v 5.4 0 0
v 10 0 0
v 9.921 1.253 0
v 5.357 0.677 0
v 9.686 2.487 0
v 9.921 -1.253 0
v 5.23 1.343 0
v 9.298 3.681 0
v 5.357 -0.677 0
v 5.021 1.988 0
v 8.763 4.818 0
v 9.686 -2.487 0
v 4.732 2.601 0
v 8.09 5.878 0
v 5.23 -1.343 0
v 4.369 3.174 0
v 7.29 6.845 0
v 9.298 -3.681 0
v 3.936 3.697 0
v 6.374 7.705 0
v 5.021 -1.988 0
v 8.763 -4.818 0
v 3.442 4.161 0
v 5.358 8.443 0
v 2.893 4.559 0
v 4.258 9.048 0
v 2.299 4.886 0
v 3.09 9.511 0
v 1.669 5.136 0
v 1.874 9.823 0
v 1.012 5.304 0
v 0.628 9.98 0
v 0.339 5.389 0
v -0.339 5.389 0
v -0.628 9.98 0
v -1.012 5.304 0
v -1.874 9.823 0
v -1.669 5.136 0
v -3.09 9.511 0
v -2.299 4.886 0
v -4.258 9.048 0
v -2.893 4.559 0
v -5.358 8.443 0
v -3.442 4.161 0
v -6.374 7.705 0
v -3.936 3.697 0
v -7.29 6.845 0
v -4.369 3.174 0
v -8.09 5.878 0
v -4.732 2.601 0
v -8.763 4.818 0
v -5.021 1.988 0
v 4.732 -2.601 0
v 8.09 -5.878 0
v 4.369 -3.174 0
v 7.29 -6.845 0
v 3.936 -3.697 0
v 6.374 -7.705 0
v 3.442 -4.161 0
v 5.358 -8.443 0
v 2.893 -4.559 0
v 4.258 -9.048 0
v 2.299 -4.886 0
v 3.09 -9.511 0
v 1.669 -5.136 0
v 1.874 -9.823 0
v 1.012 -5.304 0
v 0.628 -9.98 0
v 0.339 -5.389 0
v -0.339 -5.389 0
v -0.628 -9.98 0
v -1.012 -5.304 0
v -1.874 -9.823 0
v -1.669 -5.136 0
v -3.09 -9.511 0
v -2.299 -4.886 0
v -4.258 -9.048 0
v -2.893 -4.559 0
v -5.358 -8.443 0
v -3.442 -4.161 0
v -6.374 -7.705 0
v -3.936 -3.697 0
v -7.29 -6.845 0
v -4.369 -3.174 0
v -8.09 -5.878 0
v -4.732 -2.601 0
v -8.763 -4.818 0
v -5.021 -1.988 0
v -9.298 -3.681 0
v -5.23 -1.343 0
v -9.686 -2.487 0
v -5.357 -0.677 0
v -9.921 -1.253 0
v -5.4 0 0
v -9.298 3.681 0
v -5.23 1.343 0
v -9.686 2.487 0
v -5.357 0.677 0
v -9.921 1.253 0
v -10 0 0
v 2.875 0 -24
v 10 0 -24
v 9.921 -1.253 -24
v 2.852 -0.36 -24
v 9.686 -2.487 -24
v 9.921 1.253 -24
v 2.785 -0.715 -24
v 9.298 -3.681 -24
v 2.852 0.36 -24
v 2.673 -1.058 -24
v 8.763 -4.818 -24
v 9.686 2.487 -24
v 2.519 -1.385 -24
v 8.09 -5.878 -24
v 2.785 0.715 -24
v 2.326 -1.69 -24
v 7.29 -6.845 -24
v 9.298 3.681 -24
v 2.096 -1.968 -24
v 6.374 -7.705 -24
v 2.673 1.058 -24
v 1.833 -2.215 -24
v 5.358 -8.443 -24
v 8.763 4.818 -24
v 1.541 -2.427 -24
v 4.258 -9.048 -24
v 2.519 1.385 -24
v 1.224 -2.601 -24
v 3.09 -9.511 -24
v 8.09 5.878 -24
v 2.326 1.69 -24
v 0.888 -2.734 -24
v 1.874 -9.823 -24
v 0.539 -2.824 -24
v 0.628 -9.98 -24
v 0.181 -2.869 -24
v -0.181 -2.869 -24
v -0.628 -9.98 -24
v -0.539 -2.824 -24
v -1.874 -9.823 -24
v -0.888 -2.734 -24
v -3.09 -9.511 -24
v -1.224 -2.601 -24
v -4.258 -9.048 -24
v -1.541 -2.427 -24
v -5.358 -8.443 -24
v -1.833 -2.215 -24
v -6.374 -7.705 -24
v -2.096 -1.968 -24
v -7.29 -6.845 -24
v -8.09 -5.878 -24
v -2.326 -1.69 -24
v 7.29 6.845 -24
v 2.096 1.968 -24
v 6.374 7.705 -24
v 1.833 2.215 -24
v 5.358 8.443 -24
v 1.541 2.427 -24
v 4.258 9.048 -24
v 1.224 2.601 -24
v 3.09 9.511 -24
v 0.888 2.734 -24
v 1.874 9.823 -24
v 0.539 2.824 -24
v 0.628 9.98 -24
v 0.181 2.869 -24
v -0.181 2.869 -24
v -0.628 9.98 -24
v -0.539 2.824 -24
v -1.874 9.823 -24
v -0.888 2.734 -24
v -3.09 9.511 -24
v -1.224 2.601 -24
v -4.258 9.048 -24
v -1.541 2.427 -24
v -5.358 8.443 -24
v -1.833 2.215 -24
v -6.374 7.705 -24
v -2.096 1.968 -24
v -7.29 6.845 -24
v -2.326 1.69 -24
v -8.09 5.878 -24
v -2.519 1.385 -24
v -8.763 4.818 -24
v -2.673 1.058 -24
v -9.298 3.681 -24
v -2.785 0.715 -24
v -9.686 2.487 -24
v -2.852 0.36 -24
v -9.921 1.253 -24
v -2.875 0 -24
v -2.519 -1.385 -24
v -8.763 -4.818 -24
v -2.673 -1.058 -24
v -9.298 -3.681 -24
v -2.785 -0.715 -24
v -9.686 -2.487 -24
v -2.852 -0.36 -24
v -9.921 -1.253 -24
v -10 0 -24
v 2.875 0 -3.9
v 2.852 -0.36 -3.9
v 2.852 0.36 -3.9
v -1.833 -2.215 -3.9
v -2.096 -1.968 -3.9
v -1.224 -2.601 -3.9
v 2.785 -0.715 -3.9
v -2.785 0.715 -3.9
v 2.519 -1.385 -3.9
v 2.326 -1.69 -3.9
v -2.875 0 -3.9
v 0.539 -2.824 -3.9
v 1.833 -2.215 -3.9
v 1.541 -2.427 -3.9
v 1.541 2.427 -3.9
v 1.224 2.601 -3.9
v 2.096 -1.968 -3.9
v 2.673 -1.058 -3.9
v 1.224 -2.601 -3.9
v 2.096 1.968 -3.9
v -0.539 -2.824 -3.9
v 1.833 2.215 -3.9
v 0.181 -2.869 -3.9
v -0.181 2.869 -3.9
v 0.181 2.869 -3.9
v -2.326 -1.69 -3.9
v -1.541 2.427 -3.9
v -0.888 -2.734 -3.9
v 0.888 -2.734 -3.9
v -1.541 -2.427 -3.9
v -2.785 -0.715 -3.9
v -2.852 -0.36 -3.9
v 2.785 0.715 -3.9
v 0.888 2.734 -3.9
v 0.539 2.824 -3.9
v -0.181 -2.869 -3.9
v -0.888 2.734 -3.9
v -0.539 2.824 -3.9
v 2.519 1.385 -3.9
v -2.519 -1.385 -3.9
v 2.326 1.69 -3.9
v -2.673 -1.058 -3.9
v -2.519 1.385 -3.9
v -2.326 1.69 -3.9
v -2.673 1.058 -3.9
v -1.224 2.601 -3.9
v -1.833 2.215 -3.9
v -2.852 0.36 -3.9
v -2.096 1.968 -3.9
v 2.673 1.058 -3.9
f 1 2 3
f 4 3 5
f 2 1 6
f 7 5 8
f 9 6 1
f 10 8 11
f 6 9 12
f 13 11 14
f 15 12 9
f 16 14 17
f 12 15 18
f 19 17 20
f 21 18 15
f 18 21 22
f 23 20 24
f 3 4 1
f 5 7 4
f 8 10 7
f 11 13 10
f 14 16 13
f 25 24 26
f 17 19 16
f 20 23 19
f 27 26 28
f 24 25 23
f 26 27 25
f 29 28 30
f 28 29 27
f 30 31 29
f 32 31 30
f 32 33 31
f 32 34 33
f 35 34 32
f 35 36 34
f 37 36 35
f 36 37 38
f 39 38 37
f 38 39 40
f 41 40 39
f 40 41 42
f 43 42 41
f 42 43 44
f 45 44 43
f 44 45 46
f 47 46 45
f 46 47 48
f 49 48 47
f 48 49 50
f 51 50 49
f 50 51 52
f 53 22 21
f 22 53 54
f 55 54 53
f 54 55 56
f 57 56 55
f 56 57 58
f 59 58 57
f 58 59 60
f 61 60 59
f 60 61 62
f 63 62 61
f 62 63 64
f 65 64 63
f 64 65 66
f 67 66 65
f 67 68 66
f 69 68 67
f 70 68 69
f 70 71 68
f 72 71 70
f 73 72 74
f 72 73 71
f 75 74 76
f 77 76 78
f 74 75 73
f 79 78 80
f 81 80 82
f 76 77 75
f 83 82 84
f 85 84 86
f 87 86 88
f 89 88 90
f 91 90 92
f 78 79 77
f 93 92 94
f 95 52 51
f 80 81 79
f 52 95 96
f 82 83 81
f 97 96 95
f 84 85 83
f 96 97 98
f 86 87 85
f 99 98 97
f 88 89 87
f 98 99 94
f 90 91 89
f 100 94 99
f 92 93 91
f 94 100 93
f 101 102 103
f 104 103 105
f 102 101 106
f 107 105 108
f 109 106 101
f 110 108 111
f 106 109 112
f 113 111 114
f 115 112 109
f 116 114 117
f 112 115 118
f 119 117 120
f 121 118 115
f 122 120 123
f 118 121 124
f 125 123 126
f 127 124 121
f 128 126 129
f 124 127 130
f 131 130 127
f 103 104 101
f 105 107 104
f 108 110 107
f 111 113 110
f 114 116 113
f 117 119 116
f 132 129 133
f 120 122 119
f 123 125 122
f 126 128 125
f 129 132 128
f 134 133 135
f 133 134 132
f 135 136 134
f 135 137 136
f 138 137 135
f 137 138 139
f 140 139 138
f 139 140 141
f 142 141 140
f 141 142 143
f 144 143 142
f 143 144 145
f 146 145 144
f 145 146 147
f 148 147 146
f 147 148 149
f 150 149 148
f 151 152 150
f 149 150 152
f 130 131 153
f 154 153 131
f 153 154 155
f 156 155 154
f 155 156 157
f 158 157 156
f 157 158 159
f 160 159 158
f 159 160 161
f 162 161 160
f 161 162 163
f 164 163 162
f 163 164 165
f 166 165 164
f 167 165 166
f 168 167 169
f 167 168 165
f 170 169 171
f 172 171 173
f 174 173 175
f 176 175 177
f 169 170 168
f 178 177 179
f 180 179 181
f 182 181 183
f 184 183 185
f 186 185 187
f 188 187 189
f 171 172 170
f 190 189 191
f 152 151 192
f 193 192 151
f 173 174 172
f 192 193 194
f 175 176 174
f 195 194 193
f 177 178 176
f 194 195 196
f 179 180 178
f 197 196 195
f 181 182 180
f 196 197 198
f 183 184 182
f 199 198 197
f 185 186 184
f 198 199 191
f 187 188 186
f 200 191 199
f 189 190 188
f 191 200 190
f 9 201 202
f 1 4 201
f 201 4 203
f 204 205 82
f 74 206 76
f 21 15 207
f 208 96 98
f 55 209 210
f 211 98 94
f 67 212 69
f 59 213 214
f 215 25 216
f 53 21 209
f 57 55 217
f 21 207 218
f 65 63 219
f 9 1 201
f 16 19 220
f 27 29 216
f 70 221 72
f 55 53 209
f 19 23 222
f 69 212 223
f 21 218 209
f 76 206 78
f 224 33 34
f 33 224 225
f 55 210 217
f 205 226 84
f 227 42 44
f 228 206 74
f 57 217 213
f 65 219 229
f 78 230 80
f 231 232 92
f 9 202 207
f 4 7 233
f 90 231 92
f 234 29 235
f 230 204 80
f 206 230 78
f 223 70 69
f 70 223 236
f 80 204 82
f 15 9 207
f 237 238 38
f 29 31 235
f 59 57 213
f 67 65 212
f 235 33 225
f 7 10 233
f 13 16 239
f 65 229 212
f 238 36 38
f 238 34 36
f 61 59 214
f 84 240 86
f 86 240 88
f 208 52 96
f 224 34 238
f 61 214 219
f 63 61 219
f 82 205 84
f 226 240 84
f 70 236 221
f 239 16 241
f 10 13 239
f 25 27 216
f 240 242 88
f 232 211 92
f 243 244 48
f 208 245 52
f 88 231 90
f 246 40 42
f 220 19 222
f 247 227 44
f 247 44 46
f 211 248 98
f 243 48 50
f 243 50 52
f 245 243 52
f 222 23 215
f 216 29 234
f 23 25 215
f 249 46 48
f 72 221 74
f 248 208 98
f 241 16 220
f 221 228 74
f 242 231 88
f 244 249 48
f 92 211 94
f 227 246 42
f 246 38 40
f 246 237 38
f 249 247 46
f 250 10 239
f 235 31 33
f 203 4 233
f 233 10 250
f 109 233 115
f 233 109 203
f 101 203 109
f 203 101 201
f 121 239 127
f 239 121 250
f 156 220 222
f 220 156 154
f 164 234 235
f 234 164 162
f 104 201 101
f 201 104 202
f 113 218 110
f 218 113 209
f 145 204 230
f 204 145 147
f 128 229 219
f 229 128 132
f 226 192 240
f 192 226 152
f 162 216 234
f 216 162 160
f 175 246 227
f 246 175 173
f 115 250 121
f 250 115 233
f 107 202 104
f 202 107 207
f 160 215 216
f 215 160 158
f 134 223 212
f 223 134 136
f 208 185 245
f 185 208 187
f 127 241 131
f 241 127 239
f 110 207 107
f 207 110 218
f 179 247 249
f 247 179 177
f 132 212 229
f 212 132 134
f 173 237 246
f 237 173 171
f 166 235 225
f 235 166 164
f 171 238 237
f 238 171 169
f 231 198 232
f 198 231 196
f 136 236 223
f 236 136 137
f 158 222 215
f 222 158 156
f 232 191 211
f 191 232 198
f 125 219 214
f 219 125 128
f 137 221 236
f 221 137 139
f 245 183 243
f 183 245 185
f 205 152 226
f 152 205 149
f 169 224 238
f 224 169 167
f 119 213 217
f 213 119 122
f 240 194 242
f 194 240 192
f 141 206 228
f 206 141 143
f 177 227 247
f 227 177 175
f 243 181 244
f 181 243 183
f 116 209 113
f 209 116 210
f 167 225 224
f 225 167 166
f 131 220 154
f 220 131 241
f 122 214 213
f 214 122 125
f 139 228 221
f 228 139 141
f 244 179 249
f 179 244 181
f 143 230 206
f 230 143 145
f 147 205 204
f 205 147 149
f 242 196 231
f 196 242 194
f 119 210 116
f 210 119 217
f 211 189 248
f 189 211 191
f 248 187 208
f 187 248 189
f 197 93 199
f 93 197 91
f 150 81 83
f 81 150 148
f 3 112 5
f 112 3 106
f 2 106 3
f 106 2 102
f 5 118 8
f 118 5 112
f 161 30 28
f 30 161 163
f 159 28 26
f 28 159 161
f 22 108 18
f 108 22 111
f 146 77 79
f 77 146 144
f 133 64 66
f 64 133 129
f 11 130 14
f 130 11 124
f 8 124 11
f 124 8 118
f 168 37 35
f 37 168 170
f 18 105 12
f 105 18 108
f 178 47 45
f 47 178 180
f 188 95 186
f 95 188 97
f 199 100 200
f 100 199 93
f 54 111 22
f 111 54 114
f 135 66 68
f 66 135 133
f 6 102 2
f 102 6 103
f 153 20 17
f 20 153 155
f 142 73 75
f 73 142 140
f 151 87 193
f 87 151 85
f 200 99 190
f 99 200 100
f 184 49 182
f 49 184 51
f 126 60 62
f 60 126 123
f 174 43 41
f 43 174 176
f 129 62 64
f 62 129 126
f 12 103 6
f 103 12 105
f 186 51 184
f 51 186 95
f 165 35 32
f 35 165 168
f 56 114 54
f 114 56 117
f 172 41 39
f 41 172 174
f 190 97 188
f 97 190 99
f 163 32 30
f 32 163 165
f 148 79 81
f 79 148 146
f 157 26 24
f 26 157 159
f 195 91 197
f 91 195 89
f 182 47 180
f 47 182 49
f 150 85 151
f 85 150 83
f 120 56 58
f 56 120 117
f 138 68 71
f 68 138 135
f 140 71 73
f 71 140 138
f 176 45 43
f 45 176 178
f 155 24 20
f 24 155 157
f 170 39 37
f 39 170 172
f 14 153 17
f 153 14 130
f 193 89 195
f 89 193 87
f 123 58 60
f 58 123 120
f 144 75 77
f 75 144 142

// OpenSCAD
$fn = 50;


difference() {
	union() {
		translate(v = [0, 0, -24.0000000000]) {
			cylinder(h = 24, r = 10.0000000000);
		}
		cylinder(h = 0, r = 19.0000000000);
	}
	union() {
		translate(v = [0, 0, 0]) {
			rotate(a = [0, 0, 0]) {
				difference() {
					union() {
						#translate(v = [0, 0, -24.0000000000]) {
							cylinder(h = 24, r = 2.6000000000);
						}
						#translate(v = [0, 0, -3.9000000000]) {
							cylinder(h = 3.9000000000, r = 10.0000000000, r1 = 2.8750000000, r2 = 5.4000000000);
						}
						#translate(v = [0, 0, -24.0000000000]) {
							cylinder(h = 24, r = 2.8750000000);
						}
						#translate(v = [0, 0, -24.0000000000]) {
							cylinder(h = 24, r = 2.6000000000);
						}
					}
					union();
				}
			}
		}
	}
}
